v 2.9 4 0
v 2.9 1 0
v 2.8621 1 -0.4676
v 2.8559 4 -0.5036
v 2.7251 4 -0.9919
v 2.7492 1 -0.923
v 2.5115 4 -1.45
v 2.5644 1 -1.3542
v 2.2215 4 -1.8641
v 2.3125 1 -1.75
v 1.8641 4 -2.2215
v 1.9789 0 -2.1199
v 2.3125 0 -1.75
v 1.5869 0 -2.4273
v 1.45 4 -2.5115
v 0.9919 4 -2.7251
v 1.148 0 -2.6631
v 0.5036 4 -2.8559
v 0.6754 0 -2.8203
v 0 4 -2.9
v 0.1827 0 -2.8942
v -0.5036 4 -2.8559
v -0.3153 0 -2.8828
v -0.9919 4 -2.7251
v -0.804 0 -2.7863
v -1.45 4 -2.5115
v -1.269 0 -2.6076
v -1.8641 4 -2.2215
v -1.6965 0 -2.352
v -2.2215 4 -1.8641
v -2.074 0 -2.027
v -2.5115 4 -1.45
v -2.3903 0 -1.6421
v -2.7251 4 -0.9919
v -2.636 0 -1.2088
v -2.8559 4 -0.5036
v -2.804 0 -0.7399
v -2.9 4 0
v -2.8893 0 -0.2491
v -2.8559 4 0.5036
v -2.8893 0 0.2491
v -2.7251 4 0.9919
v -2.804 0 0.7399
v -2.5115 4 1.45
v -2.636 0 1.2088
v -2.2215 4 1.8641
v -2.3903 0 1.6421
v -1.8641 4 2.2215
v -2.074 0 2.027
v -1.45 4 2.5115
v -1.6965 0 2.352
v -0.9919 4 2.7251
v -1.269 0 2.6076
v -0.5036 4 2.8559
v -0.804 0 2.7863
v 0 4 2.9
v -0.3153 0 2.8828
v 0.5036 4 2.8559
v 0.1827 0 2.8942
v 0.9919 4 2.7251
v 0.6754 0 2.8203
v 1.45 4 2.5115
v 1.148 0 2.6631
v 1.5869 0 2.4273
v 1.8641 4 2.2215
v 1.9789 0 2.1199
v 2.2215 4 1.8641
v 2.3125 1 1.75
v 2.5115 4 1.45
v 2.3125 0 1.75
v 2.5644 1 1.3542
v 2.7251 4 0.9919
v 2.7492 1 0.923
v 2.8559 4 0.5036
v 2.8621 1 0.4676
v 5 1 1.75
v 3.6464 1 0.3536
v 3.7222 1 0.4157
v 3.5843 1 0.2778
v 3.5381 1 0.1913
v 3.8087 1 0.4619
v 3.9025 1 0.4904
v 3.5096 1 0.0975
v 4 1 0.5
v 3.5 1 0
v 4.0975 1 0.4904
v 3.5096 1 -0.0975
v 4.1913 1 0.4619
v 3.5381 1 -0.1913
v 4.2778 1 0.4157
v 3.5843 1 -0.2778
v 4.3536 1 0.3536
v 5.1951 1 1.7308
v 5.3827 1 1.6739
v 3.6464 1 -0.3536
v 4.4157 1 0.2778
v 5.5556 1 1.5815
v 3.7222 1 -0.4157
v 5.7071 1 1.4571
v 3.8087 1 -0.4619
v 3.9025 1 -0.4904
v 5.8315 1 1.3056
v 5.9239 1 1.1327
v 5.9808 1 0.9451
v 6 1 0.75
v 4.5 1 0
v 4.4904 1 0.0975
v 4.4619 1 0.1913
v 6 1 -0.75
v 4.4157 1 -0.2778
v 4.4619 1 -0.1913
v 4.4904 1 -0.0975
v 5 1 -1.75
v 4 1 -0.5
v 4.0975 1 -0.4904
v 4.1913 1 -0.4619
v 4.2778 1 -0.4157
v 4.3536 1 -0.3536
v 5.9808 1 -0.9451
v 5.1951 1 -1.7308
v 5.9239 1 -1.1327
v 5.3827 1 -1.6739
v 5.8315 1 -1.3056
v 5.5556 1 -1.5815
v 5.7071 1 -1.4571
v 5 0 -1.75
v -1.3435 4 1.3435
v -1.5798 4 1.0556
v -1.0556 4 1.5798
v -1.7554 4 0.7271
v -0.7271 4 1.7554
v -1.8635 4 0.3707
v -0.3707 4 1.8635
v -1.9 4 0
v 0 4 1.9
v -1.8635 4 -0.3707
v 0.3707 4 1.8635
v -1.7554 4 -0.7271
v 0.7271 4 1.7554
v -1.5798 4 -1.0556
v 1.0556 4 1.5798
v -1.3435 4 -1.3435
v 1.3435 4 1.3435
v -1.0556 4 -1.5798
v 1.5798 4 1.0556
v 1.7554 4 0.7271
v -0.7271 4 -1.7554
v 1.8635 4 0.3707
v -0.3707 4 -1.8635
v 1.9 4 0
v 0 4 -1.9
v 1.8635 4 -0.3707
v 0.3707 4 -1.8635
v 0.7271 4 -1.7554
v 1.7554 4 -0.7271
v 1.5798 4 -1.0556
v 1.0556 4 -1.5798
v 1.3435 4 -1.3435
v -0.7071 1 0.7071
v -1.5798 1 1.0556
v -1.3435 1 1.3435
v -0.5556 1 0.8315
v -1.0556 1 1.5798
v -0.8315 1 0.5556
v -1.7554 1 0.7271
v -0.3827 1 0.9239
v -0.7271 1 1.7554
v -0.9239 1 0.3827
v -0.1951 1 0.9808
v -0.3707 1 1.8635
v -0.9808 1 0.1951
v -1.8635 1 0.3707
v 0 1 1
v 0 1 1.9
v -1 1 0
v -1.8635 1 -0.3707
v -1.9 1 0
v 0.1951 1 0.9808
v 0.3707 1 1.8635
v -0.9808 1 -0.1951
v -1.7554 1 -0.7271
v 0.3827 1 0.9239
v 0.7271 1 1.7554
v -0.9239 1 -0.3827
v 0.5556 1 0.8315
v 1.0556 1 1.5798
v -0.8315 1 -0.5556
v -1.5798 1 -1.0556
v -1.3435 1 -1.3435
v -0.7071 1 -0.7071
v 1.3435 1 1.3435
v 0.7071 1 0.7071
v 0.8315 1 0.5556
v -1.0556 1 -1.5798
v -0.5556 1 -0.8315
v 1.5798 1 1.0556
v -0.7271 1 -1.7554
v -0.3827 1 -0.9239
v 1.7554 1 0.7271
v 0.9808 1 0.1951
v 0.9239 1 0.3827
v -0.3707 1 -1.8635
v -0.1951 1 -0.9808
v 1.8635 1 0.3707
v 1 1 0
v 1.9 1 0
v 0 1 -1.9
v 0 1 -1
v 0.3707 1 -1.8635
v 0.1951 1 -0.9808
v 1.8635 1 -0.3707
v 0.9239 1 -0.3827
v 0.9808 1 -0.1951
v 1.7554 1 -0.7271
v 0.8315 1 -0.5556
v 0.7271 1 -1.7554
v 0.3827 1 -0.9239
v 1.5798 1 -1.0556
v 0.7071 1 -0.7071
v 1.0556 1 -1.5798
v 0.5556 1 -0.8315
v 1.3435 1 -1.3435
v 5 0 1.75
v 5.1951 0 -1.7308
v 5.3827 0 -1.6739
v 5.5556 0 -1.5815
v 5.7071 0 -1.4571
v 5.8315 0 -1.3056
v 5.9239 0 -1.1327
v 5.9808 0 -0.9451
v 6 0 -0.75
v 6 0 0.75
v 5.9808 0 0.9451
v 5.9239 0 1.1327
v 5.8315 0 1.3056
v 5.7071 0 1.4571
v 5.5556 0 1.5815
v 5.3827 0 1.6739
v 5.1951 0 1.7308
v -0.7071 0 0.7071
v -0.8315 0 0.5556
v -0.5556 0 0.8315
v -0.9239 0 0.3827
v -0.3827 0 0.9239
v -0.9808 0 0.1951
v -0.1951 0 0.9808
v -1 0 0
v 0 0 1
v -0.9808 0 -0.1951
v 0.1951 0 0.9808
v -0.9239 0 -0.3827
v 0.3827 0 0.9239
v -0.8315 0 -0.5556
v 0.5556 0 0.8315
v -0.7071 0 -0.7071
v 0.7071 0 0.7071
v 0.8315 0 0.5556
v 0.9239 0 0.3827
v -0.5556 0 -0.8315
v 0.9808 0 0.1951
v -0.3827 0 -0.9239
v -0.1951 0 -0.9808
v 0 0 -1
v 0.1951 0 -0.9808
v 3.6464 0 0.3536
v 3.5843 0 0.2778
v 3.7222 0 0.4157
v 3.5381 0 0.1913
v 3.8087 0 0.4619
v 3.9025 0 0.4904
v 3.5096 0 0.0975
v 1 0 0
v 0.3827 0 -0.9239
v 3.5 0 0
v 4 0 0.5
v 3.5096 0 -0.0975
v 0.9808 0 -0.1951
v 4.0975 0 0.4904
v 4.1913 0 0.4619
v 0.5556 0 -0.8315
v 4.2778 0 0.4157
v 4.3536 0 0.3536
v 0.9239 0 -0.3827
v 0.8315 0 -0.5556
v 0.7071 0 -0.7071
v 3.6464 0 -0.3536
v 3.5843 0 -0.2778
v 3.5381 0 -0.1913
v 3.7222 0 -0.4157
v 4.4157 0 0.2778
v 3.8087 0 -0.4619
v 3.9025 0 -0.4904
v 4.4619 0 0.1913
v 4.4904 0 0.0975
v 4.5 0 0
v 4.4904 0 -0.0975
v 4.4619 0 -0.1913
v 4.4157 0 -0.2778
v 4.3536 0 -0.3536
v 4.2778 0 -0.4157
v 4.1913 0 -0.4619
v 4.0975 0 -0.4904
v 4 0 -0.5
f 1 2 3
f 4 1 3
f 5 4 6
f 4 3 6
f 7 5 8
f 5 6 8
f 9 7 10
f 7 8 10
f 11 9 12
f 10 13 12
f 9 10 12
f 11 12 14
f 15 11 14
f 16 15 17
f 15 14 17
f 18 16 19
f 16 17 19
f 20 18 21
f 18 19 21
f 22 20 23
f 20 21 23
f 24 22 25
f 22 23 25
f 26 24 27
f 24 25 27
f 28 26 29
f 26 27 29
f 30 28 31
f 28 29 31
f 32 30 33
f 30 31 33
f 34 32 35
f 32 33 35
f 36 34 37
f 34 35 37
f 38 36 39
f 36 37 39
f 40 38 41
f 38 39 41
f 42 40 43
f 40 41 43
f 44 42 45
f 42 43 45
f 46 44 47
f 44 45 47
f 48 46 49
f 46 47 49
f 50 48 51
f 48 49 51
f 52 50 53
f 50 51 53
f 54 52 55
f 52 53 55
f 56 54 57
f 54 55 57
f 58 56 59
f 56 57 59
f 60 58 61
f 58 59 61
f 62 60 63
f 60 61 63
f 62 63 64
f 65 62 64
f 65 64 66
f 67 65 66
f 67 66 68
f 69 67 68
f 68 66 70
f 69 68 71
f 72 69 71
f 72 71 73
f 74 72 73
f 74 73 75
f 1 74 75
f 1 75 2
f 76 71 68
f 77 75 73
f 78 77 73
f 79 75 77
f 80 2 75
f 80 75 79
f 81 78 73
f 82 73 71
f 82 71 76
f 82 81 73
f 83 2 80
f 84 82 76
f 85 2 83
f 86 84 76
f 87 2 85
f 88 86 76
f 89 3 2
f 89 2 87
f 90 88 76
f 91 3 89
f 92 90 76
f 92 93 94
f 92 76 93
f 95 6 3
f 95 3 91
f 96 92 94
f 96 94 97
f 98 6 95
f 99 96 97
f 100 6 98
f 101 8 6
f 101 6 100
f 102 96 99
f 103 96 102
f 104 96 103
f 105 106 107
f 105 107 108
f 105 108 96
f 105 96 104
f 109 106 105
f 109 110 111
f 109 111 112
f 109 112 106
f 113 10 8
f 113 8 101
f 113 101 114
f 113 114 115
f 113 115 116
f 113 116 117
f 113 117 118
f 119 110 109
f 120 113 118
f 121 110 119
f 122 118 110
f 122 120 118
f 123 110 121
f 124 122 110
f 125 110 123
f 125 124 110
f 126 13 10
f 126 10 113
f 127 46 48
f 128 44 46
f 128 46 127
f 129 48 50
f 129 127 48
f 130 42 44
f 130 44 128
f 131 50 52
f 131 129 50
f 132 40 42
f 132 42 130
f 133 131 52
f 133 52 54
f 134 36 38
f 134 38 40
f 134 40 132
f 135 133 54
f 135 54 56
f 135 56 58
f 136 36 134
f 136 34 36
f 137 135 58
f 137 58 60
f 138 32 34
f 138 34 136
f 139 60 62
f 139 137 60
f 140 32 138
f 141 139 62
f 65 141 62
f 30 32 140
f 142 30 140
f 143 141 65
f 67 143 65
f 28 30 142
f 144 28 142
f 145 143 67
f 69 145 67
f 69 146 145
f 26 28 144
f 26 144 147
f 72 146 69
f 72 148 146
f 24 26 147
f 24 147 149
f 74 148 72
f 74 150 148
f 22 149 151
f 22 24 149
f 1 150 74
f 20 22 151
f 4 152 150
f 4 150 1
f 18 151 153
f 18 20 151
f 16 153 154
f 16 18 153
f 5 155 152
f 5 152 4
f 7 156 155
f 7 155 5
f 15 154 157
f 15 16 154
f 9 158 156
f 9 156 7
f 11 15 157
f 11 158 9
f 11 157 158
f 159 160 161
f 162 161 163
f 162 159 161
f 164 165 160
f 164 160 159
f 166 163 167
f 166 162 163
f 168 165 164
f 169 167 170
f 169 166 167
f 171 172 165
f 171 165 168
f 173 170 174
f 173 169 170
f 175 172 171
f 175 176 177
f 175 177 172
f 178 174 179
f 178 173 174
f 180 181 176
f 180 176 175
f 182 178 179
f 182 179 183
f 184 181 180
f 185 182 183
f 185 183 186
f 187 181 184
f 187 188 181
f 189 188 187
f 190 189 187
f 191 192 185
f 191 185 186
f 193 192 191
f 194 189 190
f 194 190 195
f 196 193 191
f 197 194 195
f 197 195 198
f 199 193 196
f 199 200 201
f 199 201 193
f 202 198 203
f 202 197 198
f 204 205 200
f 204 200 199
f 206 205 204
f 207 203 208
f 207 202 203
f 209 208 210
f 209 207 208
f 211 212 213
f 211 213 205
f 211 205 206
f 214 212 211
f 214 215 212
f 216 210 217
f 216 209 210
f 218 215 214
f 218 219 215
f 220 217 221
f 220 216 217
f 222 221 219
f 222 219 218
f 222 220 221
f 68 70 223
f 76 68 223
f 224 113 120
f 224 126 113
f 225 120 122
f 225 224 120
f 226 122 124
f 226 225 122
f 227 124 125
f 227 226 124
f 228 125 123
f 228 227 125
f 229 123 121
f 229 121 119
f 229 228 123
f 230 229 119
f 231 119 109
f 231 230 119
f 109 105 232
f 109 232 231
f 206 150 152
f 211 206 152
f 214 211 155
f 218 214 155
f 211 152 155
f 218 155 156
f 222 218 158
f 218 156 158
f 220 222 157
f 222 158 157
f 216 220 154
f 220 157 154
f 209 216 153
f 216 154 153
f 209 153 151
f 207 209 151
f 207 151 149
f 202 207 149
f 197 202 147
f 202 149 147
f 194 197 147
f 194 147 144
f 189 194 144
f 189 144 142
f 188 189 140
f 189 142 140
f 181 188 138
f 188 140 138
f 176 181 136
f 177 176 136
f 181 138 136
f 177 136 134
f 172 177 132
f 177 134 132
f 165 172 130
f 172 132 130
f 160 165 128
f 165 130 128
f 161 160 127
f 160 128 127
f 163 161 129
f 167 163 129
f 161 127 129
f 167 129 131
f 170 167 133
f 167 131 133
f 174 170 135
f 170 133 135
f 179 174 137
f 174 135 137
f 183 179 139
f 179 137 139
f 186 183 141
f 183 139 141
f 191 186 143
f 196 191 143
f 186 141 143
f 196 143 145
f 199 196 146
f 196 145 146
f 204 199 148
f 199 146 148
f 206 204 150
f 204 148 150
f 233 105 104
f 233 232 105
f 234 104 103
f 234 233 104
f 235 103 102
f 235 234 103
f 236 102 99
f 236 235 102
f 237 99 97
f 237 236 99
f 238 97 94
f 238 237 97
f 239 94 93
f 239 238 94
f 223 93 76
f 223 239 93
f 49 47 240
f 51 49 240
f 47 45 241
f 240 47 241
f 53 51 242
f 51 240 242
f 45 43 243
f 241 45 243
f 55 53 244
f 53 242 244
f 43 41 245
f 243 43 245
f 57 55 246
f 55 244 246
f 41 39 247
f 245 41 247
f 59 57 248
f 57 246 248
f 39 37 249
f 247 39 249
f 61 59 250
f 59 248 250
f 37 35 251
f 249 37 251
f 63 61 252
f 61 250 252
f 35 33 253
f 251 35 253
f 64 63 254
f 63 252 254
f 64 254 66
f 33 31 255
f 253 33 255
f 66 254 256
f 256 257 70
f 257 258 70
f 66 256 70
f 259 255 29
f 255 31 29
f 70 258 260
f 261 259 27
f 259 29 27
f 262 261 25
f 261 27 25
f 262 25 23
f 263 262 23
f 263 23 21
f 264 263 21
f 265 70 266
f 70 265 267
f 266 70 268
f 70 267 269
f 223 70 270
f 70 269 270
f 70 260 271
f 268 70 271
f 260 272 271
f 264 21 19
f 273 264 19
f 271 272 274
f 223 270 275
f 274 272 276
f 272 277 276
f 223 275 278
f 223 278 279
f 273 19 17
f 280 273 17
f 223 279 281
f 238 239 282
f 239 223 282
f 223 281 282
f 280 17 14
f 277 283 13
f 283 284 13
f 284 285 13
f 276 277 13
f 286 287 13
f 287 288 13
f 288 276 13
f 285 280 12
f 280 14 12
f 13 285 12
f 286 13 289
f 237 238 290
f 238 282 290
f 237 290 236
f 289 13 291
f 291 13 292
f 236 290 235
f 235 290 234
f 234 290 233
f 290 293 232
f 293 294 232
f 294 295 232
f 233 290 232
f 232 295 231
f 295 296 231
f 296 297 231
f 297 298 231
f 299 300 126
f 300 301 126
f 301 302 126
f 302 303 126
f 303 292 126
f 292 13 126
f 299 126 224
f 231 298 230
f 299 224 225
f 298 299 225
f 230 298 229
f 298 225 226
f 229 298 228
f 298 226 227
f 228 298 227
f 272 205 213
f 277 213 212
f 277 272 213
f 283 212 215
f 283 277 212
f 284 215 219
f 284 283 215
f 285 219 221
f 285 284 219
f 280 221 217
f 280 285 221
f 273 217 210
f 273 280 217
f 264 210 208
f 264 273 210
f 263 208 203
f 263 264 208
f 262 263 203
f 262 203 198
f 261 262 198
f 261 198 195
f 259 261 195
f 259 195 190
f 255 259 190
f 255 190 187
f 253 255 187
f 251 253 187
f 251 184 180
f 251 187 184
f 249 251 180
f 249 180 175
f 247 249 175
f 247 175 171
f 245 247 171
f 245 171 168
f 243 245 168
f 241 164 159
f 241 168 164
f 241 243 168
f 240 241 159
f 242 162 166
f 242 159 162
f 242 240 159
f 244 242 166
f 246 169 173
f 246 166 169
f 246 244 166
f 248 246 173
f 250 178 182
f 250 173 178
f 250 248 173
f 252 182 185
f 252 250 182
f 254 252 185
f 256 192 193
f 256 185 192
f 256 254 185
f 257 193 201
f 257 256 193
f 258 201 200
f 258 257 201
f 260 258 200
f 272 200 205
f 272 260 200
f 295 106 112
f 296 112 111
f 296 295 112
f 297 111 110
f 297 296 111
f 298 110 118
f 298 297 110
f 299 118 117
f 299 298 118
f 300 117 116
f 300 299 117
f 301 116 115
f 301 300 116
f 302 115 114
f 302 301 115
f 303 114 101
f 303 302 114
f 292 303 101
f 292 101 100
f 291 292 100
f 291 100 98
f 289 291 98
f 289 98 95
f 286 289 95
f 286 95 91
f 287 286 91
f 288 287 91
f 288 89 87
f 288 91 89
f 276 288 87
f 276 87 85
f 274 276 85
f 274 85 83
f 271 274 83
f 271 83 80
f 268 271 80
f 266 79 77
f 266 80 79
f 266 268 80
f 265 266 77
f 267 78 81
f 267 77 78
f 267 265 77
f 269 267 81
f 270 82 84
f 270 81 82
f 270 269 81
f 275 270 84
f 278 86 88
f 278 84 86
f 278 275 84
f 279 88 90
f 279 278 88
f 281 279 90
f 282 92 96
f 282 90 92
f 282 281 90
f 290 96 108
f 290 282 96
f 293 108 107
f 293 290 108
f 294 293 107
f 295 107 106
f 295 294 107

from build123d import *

# Parameters (mm, degrees)
SKETCH_1_R          = 2.9
EXTRUDE_1_DEPTH     = 4
SKETCH_2_W          = 12.628096459
SKETCH_2_H          = 3.5
EXTRUDE_2_DEPTH     = 1
SKETCH_3_R          = 0.5
SKETCH_3_R_2        = 1
CUT_EXTRUDE_1_DEPTH = 5
FILLET_1_R          = 1.5
SKETCH_4_R          = 1.9
CUT_EXTRUDE_2_DEPTH = 3
SKETCH_5_W          = 9.116647883
SKETCH_5_H          = 3.5
CUT_EXTRUDE_3_DEPTH = 2
FILLET_2_R          = 1


with BuildPart() as part:
    # 草图1 → 凸台-拉伸1 (new body)
    with BuildSketch(Plane(origin=(0, 0, 0), x_dir=(1, 0, 0), z_dir=(0, 1, 0))):
        Circle(SKETCH_1_R)
    extrude(amount=EXTRUDE_1_DEPTH)

    # 草图2 → 凸台-拉伸2 (add)
    with BuildSketch(Plane(origin=(0, 0, 0), x_dir=(1, 0, 0), z_dir=(0, 1, 0))):
        with Locations((7.685951771, 0)):
            Rectangle(SKETCH_2_W, SKETCH_2_H)
    extrude(amount=EXTRUDE_2_DEPTH)

    # 草图3 → 切除-拉伸1 (cut, through all)
    with BuildSketch(Plane(origin=(0, 0, 0), x_dir=(1, 0, 0), z_dir=(0, 1, 0))):
        with Locations((8, 0)):
            Circle(SKETCH_3_R)
        with Locations((12, 0)):
            Circle(SKETCH_3_R)
        with Locations((10, 0)):
            Circle(SKETCH_3_R)
        Circle(SKETCH_3_R_2)
        with Locations((4, 0)):
            Circle(SKETCH_3_R)
    extrude(amount=CUT_EXTRUDE_1_DEPTH, mode=Mode.SUBTRACT)

    # 圆角1
    fillet_1_edges = [part.edges().sort_by_distance(p)[0] for p in [
        (14, 0.5, -1.75),
        (14, 0.5, 1.75),
    ]]
    fillet(fillet_1_edges, radius=FILLET_1_R)

    # 草图4 → 切除-拉伸2 (cut)
    with BuildSketch(Plane(origin=(0, 4, 0), x_dir=(1, 0, 0), z_dir=(0, 1, 0))):
        Circle(SKETCH_4_R)
    extrude(amount=-CUT_EXTRUDE_2_DEPTH, mode=Mode.SUBTRACT)

    # 草图5 → 切除-拉伸3 (cut, through all)
    with BuildSketch(Plane(origin=(0, 1, 0), x_dir=(1, 0, 0), z_dir=(0, 1, 0))):
        with Locations((10.558323941, 0)):
            Rectangle(SKETCH_5_W, SKETCH_5_H)
    extrude(amount=-CUT_EXTRUDE_3_DEPTH, mode=Mode.SUBTRACT)

    # 圆角2
    fillet_2_edges = [part.edges().sort_by_distance(p)[0] for p in [
        (6, 0.5, 1.75),
        (6, 0.5, -1.75),
    ]]
    fillet(fillet_2_edges, radius=FILLET_2_R)


solid = part.part
